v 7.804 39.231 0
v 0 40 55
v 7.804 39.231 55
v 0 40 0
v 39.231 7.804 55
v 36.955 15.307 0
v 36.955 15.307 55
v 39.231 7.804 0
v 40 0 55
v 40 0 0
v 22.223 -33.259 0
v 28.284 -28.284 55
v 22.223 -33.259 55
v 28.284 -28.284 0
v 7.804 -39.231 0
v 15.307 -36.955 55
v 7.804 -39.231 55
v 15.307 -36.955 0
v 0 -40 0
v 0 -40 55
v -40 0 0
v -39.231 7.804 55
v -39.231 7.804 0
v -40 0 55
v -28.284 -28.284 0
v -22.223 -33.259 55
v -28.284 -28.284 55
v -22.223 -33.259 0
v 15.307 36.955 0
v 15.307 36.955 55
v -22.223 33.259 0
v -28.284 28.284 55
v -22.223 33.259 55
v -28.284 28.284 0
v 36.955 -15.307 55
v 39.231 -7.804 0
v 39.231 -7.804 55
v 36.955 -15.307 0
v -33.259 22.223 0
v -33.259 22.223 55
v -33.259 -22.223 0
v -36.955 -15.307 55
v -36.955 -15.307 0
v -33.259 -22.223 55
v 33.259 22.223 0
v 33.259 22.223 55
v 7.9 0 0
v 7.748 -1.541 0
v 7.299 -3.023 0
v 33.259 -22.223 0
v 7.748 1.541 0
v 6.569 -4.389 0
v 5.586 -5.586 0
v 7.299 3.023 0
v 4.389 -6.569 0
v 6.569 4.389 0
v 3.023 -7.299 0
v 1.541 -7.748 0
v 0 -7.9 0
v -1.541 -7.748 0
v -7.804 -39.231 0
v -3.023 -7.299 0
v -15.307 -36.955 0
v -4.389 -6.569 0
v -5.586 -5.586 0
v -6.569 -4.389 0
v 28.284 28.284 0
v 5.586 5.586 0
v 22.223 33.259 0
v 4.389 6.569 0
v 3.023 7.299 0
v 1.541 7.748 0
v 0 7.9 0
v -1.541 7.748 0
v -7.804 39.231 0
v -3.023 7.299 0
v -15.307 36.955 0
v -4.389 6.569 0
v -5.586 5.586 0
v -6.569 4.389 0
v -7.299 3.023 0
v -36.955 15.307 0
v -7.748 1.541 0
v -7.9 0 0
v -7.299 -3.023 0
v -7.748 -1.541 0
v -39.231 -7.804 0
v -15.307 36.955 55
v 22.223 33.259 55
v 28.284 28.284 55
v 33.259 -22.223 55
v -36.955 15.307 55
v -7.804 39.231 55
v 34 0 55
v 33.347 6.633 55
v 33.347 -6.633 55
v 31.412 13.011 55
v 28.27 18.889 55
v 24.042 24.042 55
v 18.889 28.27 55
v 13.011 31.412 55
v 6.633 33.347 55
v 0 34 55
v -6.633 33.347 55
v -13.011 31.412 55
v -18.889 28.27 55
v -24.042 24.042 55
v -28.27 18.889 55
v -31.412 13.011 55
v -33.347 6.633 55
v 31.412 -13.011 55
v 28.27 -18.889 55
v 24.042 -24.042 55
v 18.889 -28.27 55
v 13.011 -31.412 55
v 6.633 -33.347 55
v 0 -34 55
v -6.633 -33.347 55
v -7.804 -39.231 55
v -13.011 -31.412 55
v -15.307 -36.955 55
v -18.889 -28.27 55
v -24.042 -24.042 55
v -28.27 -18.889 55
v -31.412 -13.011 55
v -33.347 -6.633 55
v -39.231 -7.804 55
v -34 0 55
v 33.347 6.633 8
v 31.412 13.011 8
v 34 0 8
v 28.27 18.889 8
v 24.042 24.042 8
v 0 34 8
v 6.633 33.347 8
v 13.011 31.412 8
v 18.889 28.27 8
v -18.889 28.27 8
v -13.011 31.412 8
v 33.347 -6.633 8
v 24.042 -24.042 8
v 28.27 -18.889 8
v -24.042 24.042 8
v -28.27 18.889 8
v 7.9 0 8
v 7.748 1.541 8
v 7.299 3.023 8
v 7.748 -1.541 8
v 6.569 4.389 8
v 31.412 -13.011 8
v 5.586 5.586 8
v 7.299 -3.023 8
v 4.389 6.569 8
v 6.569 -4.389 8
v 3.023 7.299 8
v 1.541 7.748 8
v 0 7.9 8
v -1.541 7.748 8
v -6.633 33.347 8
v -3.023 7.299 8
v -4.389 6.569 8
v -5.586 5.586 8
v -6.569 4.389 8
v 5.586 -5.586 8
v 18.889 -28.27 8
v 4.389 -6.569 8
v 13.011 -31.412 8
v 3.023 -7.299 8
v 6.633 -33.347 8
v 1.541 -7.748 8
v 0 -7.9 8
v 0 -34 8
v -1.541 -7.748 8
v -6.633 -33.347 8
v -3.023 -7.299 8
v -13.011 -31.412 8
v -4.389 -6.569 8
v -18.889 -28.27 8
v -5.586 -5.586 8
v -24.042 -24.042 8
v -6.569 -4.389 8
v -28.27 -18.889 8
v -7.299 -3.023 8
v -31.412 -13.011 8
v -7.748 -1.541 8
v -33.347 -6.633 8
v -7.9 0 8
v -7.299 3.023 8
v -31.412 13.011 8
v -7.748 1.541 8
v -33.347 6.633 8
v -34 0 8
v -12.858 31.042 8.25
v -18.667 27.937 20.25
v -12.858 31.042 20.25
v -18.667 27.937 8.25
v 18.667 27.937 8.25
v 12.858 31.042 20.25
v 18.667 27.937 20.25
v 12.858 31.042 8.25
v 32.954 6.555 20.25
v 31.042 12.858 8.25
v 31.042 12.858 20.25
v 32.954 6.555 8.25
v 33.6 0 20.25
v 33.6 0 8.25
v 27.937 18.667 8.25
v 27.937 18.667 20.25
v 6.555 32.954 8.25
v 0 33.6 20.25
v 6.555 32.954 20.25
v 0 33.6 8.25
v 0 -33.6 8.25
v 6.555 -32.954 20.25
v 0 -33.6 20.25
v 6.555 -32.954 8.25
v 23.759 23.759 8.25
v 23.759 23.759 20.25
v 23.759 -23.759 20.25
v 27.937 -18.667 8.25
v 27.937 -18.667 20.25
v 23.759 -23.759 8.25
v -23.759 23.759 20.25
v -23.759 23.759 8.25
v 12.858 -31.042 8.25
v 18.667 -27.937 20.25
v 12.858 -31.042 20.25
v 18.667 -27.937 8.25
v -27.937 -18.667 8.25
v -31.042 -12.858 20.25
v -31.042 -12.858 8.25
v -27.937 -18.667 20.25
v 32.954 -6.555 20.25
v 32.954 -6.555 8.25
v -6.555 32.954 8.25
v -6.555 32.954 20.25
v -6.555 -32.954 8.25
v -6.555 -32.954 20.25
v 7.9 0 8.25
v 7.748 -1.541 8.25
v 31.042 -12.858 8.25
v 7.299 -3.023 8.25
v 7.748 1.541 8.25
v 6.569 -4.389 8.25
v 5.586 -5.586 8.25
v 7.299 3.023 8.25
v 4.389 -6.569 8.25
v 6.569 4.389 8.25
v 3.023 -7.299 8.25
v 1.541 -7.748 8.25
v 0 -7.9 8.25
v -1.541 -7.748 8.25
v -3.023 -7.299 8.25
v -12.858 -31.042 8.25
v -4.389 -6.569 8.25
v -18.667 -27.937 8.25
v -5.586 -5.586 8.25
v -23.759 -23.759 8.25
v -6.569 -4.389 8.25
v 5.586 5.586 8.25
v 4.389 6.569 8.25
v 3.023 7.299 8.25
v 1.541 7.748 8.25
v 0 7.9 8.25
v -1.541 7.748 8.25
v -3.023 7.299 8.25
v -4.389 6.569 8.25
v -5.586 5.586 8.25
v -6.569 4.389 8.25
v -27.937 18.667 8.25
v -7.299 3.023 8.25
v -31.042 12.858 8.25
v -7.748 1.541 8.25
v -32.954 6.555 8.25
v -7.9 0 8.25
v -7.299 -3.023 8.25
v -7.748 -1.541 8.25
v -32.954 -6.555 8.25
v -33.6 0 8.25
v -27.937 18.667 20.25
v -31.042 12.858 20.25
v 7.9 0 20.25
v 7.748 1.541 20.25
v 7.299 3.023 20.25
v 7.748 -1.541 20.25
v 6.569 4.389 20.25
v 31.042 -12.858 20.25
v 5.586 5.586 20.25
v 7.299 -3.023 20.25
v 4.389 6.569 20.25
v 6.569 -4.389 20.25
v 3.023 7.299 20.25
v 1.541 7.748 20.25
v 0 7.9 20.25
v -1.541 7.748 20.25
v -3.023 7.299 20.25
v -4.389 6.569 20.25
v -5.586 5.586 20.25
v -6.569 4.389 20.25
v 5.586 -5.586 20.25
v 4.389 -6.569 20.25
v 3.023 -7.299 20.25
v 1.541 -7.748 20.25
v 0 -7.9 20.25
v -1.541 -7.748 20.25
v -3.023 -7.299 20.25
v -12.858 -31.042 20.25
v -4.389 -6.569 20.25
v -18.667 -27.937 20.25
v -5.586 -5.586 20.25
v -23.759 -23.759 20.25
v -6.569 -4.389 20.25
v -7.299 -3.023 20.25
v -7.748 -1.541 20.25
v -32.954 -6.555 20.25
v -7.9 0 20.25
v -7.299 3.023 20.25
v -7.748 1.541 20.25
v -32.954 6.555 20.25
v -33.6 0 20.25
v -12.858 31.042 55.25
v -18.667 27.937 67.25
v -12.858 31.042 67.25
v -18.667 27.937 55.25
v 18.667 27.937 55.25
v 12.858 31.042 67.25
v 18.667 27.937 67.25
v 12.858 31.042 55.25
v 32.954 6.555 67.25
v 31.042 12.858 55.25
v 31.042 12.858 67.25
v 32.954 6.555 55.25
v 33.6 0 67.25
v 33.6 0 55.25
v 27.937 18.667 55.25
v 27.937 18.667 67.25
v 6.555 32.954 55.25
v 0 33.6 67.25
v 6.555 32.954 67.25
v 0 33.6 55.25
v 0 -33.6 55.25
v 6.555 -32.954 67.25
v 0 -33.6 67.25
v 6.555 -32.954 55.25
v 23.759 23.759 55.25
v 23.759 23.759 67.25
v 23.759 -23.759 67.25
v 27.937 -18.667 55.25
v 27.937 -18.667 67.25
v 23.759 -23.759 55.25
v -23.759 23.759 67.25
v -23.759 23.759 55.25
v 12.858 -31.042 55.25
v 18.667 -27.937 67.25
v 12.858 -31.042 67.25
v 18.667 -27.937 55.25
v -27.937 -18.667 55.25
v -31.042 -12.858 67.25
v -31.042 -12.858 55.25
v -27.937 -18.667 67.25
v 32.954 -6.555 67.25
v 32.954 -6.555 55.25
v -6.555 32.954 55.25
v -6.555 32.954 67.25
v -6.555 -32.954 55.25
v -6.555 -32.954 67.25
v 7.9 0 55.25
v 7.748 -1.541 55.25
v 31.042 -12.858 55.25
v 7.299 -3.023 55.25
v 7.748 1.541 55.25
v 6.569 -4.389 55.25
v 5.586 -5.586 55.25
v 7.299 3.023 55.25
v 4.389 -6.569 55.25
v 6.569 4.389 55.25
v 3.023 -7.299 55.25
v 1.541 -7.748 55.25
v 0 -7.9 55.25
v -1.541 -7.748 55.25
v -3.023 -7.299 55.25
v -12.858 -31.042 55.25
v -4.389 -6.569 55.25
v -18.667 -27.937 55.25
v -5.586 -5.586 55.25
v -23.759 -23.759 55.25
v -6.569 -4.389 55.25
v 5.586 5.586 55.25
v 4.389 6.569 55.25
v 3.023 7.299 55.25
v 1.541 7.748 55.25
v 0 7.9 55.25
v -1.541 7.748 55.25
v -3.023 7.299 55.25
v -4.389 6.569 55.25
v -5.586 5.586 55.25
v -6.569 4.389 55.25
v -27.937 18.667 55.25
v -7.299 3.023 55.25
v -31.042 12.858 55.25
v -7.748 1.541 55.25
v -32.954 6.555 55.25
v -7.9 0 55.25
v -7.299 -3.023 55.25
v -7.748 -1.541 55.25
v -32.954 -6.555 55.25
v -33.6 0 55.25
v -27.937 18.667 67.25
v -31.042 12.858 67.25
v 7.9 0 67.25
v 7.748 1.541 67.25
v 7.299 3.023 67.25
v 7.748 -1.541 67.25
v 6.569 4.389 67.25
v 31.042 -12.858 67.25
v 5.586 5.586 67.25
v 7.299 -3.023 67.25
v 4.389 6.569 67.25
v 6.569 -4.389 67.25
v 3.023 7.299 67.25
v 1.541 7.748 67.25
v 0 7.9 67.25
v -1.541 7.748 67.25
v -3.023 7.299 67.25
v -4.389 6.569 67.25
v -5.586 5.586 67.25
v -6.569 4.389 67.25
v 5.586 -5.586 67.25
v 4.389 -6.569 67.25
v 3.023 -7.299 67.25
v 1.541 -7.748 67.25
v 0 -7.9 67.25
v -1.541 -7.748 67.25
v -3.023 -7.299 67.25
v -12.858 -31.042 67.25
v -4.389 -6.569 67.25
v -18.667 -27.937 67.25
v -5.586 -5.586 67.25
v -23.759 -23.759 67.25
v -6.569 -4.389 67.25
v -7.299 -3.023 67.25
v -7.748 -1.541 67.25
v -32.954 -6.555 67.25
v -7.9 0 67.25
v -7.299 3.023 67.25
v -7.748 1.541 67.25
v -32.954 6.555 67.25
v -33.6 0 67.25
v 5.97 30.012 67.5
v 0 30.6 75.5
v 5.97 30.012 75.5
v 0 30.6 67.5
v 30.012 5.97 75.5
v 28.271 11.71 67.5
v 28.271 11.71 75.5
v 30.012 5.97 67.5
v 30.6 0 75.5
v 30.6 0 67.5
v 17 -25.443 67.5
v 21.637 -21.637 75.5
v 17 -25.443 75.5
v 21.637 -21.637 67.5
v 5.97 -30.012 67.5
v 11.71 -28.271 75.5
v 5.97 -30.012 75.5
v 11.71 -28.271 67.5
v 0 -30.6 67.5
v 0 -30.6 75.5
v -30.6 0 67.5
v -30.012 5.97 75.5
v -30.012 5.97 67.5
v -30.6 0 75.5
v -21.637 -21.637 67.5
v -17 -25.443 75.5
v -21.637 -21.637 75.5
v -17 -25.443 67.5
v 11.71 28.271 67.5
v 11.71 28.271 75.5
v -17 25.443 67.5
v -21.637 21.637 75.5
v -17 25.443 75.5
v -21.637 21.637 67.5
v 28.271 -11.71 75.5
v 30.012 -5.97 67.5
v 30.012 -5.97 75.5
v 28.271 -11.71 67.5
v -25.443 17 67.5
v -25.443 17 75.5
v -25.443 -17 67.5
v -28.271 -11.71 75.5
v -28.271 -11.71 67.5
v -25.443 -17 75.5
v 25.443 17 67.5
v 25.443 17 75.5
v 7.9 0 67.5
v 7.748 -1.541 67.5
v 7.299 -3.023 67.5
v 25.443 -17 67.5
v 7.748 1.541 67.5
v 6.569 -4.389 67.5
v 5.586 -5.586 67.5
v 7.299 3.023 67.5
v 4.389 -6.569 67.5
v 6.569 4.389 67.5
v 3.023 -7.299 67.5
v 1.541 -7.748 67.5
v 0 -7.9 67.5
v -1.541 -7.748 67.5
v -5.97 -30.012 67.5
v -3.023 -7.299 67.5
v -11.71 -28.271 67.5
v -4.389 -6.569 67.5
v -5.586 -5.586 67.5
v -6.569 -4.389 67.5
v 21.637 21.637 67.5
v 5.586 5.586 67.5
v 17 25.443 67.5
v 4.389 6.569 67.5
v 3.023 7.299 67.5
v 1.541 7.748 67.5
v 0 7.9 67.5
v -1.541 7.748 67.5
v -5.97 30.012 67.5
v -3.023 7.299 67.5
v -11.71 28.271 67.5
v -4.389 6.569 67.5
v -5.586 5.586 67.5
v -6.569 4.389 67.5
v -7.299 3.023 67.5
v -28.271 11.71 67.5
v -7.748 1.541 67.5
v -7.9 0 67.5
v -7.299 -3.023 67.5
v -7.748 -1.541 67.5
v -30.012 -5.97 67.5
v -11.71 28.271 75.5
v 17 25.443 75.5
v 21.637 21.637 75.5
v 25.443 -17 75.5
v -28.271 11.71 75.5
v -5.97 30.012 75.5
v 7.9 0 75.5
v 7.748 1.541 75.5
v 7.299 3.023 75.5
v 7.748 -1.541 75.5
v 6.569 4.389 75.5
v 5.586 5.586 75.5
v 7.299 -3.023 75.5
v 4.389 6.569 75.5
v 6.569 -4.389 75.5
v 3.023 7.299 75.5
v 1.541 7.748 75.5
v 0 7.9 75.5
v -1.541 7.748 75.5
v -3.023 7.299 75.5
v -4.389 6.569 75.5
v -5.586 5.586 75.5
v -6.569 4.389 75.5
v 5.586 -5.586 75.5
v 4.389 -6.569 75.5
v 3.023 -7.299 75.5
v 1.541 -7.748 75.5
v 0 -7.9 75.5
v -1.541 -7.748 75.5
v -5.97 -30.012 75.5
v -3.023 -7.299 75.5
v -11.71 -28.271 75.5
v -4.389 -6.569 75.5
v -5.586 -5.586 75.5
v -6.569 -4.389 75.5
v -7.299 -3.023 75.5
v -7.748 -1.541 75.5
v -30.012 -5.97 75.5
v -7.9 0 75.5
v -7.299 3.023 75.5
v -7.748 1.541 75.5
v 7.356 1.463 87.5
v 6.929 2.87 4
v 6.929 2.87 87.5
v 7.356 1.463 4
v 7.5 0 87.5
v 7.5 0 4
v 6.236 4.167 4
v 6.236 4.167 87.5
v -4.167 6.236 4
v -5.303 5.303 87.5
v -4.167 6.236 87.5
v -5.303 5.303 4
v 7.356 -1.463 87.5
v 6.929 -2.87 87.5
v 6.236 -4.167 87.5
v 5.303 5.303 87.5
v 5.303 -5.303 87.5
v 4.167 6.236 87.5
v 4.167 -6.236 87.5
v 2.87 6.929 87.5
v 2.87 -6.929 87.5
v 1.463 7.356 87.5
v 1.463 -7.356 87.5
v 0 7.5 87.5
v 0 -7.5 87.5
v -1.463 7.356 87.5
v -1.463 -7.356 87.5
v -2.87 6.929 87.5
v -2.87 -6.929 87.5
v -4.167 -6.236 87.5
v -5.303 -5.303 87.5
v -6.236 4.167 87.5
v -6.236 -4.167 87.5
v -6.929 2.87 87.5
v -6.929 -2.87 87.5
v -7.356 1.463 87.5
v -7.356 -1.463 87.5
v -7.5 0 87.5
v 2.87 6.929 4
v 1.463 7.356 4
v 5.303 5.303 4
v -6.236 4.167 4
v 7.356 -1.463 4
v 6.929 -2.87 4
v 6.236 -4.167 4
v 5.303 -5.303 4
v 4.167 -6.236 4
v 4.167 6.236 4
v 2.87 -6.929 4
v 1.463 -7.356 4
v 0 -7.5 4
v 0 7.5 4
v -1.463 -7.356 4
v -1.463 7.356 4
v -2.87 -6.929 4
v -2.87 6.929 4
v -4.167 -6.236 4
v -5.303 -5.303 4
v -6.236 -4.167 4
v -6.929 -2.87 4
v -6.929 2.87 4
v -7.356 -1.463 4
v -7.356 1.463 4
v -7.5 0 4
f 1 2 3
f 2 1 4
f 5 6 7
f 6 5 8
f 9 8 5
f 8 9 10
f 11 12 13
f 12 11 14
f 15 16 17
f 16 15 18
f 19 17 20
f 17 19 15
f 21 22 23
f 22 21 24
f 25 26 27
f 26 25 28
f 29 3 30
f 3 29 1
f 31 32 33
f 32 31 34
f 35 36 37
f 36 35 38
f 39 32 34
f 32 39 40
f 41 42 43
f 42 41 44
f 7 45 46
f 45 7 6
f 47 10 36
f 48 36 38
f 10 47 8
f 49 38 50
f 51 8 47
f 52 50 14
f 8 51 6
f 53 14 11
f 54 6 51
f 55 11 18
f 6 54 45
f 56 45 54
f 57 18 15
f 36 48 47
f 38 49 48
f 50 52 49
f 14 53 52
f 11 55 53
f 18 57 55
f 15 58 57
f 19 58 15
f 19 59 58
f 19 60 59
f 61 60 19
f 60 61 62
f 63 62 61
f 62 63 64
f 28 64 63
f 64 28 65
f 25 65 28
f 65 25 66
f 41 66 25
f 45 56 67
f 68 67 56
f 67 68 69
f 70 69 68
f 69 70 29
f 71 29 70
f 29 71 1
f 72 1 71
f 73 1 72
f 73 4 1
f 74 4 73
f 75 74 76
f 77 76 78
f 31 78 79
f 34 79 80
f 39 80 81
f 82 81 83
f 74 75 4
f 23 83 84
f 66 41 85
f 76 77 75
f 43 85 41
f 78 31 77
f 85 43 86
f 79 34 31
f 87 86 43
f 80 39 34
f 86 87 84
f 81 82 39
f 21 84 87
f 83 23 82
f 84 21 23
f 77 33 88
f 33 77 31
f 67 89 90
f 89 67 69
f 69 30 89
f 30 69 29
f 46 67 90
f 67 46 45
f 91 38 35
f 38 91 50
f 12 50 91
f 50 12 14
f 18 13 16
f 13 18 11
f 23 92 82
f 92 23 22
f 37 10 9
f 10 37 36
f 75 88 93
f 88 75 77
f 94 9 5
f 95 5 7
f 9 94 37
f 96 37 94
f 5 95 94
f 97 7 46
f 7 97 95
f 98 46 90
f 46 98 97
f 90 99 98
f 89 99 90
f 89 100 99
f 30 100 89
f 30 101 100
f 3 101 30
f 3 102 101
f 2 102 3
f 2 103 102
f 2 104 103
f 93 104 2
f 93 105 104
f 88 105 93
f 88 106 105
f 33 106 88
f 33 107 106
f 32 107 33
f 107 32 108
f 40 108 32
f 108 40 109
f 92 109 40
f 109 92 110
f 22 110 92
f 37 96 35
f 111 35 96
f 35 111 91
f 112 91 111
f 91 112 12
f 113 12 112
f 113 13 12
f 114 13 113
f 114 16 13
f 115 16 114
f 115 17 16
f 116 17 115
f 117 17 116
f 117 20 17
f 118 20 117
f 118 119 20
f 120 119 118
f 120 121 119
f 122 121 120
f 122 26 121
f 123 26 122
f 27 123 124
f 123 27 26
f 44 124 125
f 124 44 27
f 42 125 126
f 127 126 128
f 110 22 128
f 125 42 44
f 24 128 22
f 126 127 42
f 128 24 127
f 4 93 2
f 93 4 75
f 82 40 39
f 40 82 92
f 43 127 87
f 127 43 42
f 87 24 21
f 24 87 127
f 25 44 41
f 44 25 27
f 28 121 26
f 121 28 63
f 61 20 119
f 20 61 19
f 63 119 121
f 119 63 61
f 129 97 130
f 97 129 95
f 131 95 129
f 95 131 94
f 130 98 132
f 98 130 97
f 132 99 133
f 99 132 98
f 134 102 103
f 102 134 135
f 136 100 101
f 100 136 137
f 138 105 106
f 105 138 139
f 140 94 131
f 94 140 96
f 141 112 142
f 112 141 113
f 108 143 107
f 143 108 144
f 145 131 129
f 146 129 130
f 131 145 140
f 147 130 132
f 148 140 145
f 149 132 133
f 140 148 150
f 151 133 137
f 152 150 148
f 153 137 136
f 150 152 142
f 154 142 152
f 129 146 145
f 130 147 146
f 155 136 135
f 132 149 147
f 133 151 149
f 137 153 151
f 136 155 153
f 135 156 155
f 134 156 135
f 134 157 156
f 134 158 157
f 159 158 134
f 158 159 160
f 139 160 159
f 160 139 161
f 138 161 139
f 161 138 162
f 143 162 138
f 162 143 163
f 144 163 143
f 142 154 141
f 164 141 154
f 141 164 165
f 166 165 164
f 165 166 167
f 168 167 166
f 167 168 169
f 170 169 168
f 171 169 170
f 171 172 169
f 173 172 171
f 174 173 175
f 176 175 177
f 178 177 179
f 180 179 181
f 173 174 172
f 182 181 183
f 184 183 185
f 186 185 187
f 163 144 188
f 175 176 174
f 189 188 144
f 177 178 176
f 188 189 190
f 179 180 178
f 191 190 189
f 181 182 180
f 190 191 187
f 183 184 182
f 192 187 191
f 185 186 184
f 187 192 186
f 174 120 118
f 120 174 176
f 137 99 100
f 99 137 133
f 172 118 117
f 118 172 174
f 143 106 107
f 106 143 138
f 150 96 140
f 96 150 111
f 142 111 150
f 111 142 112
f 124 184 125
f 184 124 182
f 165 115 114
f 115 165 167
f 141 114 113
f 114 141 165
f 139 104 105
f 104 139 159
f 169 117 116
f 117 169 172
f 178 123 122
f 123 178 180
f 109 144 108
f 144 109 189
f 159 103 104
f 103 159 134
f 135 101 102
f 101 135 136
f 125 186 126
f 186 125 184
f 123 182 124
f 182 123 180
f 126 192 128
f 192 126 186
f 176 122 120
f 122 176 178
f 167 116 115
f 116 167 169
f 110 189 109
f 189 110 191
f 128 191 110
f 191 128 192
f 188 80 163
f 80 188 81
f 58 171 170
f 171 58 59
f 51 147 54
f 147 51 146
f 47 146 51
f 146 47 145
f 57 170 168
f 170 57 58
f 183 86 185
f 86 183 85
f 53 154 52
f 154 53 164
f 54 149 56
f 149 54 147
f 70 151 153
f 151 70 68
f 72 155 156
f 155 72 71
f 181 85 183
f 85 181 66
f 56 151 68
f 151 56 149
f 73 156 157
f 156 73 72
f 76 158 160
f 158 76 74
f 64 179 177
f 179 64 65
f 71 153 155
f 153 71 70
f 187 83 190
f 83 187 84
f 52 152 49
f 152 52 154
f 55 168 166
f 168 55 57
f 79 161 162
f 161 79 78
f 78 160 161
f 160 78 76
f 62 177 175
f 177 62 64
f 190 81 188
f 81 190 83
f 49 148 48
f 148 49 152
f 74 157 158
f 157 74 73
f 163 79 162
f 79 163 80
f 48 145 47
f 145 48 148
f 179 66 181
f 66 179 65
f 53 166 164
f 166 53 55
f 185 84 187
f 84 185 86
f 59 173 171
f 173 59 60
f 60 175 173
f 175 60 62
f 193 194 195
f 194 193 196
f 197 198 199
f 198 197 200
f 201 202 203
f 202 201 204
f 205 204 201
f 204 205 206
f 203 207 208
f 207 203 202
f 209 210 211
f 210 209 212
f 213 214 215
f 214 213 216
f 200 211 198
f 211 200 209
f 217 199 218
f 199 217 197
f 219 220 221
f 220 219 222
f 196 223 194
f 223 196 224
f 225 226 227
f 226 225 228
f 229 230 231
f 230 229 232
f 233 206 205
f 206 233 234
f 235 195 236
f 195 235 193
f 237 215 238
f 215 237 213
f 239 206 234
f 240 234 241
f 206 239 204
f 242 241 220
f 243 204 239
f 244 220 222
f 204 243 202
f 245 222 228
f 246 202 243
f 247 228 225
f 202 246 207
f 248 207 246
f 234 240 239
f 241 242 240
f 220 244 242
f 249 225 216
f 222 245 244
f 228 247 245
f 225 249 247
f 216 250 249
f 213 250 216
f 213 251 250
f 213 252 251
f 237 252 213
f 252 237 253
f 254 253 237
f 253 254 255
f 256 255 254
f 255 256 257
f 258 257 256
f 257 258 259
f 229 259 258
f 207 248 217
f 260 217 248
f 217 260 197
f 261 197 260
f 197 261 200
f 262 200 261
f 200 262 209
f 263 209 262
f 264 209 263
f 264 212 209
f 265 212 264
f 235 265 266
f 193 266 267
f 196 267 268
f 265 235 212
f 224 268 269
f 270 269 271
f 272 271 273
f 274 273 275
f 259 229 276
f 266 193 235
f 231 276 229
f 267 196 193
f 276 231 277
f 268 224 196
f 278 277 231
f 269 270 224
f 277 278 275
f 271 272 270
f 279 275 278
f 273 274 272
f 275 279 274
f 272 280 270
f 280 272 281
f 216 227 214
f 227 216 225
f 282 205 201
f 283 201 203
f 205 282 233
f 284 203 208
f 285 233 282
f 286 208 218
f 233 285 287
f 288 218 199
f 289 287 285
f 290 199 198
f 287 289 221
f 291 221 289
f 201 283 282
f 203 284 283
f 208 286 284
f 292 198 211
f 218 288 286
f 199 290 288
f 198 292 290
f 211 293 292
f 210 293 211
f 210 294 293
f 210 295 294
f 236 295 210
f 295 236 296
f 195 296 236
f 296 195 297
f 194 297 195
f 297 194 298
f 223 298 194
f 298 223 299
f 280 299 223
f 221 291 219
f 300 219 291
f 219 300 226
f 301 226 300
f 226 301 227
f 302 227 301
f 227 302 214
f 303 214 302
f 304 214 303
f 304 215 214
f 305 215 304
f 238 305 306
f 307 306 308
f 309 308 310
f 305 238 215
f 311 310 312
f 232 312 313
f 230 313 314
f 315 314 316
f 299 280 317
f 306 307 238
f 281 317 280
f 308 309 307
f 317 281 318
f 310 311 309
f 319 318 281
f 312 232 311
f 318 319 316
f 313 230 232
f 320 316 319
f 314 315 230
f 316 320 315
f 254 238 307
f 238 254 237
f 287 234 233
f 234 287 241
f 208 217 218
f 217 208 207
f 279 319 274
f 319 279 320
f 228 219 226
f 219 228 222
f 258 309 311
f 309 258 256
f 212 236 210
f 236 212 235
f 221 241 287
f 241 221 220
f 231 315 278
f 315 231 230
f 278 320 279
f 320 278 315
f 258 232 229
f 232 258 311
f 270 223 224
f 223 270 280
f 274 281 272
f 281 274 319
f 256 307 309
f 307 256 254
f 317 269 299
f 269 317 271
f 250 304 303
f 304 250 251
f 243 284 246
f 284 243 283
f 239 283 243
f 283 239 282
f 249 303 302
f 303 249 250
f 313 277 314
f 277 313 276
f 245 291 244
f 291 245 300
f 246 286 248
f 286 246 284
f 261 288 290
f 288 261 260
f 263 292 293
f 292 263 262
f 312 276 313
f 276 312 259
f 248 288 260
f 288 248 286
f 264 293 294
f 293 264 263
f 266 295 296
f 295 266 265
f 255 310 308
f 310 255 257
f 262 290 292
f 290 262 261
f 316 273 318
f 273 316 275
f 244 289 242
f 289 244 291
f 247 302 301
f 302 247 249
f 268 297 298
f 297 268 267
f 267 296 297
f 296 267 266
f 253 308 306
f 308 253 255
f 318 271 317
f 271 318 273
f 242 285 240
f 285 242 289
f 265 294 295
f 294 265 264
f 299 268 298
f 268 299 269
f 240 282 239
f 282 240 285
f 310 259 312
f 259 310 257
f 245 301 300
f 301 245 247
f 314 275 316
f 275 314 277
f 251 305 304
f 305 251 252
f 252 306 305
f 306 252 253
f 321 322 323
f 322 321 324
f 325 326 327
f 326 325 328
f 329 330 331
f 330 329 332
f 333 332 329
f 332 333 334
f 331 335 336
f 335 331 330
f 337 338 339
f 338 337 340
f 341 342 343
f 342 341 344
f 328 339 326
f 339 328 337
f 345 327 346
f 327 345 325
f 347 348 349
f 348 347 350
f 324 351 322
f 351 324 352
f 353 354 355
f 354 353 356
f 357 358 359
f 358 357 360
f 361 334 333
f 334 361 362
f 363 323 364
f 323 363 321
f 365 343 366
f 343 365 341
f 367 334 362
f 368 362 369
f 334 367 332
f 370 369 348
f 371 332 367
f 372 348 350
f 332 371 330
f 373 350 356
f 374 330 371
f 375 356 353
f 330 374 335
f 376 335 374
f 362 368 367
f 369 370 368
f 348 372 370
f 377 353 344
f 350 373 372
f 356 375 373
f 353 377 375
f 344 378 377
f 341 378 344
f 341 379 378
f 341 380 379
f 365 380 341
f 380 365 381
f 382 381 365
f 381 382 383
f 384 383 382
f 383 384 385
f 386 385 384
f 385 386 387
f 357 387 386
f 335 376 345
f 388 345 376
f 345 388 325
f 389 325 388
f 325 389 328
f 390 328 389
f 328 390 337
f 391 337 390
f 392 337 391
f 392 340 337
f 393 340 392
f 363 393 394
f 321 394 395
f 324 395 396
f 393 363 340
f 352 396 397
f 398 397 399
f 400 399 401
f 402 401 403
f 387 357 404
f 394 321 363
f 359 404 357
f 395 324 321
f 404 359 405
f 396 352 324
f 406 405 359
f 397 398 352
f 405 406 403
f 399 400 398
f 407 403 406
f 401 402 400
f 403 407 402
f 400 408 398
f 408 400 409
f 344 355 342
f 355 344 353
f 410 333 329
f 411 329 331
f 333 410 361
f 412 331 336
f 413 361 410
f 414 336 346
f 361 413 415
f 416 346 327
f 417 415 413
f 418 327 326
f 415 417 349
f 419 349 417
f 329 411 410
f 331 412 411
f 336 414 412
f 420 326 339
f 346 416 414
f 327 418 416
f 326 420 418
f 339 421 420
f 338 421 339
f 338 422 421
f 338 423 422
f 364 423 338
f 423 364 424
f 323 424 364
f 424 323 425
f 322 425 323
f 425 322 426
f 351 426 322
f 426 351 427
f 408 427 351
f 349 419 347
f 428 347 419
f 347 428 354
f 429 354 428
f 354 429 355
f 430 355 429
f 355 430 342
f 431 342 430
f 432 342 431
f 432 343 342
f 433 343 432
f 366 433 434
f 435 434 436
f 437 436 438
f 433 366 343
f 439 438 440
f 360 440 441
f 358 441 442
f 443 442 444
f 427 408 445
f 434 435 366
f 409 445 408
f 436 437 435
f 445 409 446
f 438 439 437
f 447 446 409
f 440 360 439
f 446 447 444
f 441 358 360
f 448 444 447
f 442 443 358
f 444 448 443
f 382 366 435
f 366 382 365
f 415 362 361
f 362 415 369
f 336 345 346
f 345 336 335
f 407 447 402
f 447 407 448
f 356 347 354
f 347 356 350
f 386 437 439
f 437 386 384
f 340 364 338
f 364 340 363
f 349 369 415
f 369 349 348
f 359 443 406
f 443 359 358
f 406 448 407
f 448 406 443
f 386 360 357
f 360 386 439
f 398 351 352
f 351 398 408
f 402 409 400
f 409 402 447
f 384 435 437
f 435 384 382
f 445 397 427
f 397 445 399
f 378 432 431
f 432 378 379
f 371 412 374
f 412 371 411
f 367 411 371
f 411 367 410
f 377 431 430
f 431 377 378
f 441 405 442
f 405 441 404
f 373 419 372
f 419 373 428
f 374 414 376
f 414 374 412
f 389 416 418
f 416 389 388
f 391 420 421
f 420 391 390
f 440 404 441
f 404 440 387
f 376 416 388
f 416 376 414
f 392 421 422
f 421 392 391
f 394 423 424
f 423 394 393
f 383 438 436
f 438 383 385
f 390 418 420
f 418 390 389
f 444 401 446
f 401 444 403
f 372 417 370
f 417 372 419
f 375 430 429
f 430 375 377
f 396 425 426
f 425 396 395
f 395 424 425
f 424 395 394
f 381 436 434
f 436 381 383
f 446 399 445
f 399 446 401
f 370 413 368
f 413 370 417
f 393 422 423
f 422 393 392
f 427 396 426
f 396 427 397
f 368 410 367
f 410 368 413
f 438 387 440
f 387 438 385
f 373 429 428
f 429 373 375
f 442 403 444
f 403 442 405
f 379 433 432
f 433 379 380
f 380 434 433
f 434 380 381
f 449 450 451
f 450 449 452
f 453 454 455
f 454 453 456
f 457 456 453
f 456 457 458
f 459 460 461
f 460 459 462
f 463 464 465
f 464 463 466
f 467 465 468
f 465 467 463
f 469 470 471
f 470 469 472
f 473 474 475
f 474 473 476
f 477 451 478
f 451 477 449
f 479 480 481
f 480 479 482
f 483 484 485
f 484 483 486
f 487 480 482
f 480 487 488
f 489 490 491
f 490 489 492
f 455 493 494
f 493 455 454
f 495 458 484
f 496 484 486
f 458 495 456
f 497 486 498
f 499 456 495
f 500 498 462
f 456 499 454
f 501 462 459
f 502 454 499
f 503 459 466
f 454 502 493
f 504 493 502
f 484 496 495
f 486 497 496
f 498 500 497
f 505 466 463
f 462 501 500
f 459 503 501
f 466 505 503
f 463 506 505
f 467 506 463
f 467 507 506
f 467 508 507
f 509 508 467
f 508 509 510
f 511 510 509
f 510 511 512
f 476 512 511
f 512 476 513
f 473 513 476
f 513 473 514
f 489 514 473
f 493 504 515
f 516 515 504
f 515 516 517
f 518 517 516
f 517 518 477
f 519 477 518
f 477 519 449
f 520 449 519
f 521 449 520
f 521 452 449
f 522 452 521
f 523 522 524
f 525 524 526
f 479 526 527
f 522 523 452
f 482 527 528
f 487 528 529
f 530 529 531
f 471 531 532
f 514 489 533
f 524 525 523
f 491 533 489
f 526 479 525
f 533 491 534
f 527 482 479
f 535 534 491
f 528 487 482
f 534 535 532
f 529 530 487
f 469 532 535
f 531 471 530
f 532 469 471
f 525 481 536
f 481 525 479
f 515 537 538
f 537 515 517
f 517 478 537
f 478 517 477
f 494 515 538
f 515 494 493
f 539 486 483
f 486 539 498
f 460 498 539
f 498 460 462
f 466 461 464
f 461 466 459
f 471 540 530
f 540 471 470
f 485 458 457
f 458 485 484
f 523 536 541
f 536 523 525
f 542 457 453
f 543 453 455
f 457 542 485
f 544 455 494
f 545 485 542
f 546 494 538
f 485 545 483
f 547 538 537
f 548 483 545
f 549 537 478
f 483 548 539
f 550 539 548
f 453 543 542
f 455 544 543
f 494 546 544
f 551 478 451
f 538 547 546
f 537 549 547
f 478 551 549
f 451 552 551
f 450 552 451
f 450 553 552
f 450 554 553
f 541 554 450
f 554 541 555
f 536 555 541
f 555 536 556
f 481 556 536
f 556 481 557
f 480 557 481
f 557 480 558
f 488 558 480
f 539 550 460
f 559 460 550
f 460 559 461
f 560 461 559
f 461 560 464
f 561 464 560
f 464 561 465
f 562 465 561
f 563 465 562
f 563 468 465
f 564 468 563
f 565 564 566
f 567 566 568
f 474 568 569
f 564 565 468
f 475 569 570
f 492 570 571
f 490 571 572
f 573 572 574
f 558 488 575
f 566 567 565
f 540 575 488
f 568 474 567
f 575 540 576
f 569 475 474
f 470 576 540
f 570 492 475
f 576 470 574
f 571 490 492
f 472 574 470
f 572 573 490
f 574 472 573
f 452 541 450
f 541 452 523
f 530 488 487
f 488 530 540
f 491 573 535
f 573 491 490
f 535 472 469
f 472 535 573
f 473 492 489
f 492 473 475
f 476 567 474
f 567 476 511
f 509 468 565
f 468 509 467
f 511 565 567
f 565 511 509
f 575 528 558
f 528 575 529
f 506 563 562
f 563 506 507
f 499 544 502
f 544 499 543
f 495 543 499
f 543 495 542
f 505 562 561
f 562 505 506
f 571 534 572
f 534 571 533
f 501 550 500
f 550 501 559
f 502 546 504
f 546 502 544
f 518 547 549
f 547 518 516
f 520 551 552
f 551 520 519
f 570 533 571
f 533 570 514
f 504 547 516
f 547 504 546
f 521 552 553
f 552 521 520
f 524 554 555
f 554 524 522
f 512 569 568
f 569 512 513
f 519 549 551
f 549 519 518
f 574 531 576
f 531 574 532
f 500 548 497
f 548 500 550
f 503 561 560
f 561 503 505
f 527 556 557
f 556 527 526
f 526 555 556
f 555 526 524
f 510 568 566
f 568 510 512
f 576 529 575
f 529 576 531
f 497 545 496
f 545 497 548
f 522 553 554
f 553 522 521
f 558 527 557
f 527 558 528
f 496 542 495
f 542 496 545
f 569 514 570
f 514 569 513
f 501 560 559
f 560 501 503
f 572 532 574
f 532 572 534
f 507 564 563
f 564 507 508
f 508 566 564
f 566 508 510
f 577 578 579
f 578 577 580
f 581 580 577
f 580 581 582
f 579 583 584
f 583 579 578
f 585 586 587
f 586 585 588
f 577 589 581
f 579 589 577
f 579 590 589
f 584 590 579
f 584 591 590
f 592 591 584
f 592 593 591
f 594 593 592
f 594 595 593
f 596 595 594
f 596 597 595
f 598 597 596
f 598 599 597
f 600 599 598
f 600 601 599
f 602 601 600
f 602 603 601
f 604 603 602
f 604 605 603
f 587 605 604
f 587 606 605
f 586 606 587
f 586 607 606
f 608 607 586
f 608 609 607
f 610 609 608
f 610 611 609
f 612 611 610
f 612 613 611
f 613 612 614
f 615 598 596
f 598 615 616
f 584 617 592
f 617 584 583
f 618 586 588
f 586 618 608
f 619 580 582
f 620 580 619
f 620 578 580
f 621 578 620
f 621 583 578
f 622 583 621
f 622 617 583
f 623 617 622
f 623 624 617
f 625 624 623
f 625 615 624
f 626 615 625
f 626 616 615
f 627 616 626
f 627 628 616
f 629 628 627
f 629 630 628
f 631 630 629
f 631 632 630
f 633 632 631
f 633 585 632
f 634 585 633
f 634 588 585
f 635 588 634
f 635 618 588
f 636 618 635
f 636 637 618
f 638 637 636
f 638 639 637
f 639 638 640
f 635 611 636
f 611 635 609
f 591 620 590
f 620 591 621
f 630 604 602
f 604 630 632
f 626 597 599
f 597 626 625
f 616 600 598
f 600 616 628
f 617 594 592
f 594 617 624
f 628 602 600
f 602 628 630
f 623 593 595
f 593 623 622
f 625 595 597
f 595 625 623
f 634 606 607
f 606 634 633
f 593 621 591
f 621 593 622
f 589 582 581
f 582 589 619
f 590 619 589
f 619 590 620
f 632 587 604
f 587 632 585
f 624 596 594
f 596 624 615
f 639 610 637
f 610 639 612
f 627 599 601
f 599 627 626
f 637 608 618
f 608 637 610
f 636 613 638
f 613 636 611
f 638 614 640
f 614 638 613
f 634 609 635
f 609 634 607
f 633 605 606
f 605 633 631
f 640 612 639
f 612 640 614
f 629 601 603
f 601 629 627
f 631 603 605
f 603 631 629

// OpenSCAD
$fn = 32;

// ------------------------------------------------------------------------
// Bearing housing: housing d80, two bearings and a shaft
// Every part is its own module, assembly() places them once.
// ------------------------------------------------------------------------

// --- part 1 ---
module housing() {
  difference() {
    cylinder(h = 55, d = 80);
    translate([0, 0, 8]) cylinder(h = 48, d = 68);
    translate([0, 0, -1]) cylinder(h = 10, d = 15.8);
  }
}

// --- part 2 ---
module bearing_lower() {
  difference() {
      translate([0, 0, 0]) cylinder(h = 12, d = 67.2);
      translate([0, 0, -1]) cylinder(h = 14, d = 15.8);
    }
}

// --- part 3 ---
module bearing_upper() {
  difference() {
      translate([0, 0, 0]) cylinder(h = 12, d = 67.2);
      translate([0, 0, -1]) cylinder(h = 14, d = 15.8);
    }
}

// --- part 4 ---
module spacer() {
  difference() {
      translate([0, 0, 0]) cylinder(h = 8, d = 61.2);
      translate([0, 0, -1]) cylinder(h = 10, d = 15.8);
    }
}

// --- part 5 ---
module shaft() {
  translate([0, 0, -41.75]) cylinder(h = 83.5, d = 15);
}

// --- assembly ---
module assembly() {
  translate([0, 0, 0]) rotate([0, 0, 0]) housing();
  translate([0, 0, 8.25]) rotate([0, 0, 0]) bearing_lower();
  translate([0, 0, 55.25]) rotate([0, 0, 0]) bearing_upper();
  translate([0, 0, 67.5]) rotate([0, 0, 0]) spacer();
  translate([0, 0, 45.75]) rotate([0, 0, 0]) shaft();
}

assembly();
